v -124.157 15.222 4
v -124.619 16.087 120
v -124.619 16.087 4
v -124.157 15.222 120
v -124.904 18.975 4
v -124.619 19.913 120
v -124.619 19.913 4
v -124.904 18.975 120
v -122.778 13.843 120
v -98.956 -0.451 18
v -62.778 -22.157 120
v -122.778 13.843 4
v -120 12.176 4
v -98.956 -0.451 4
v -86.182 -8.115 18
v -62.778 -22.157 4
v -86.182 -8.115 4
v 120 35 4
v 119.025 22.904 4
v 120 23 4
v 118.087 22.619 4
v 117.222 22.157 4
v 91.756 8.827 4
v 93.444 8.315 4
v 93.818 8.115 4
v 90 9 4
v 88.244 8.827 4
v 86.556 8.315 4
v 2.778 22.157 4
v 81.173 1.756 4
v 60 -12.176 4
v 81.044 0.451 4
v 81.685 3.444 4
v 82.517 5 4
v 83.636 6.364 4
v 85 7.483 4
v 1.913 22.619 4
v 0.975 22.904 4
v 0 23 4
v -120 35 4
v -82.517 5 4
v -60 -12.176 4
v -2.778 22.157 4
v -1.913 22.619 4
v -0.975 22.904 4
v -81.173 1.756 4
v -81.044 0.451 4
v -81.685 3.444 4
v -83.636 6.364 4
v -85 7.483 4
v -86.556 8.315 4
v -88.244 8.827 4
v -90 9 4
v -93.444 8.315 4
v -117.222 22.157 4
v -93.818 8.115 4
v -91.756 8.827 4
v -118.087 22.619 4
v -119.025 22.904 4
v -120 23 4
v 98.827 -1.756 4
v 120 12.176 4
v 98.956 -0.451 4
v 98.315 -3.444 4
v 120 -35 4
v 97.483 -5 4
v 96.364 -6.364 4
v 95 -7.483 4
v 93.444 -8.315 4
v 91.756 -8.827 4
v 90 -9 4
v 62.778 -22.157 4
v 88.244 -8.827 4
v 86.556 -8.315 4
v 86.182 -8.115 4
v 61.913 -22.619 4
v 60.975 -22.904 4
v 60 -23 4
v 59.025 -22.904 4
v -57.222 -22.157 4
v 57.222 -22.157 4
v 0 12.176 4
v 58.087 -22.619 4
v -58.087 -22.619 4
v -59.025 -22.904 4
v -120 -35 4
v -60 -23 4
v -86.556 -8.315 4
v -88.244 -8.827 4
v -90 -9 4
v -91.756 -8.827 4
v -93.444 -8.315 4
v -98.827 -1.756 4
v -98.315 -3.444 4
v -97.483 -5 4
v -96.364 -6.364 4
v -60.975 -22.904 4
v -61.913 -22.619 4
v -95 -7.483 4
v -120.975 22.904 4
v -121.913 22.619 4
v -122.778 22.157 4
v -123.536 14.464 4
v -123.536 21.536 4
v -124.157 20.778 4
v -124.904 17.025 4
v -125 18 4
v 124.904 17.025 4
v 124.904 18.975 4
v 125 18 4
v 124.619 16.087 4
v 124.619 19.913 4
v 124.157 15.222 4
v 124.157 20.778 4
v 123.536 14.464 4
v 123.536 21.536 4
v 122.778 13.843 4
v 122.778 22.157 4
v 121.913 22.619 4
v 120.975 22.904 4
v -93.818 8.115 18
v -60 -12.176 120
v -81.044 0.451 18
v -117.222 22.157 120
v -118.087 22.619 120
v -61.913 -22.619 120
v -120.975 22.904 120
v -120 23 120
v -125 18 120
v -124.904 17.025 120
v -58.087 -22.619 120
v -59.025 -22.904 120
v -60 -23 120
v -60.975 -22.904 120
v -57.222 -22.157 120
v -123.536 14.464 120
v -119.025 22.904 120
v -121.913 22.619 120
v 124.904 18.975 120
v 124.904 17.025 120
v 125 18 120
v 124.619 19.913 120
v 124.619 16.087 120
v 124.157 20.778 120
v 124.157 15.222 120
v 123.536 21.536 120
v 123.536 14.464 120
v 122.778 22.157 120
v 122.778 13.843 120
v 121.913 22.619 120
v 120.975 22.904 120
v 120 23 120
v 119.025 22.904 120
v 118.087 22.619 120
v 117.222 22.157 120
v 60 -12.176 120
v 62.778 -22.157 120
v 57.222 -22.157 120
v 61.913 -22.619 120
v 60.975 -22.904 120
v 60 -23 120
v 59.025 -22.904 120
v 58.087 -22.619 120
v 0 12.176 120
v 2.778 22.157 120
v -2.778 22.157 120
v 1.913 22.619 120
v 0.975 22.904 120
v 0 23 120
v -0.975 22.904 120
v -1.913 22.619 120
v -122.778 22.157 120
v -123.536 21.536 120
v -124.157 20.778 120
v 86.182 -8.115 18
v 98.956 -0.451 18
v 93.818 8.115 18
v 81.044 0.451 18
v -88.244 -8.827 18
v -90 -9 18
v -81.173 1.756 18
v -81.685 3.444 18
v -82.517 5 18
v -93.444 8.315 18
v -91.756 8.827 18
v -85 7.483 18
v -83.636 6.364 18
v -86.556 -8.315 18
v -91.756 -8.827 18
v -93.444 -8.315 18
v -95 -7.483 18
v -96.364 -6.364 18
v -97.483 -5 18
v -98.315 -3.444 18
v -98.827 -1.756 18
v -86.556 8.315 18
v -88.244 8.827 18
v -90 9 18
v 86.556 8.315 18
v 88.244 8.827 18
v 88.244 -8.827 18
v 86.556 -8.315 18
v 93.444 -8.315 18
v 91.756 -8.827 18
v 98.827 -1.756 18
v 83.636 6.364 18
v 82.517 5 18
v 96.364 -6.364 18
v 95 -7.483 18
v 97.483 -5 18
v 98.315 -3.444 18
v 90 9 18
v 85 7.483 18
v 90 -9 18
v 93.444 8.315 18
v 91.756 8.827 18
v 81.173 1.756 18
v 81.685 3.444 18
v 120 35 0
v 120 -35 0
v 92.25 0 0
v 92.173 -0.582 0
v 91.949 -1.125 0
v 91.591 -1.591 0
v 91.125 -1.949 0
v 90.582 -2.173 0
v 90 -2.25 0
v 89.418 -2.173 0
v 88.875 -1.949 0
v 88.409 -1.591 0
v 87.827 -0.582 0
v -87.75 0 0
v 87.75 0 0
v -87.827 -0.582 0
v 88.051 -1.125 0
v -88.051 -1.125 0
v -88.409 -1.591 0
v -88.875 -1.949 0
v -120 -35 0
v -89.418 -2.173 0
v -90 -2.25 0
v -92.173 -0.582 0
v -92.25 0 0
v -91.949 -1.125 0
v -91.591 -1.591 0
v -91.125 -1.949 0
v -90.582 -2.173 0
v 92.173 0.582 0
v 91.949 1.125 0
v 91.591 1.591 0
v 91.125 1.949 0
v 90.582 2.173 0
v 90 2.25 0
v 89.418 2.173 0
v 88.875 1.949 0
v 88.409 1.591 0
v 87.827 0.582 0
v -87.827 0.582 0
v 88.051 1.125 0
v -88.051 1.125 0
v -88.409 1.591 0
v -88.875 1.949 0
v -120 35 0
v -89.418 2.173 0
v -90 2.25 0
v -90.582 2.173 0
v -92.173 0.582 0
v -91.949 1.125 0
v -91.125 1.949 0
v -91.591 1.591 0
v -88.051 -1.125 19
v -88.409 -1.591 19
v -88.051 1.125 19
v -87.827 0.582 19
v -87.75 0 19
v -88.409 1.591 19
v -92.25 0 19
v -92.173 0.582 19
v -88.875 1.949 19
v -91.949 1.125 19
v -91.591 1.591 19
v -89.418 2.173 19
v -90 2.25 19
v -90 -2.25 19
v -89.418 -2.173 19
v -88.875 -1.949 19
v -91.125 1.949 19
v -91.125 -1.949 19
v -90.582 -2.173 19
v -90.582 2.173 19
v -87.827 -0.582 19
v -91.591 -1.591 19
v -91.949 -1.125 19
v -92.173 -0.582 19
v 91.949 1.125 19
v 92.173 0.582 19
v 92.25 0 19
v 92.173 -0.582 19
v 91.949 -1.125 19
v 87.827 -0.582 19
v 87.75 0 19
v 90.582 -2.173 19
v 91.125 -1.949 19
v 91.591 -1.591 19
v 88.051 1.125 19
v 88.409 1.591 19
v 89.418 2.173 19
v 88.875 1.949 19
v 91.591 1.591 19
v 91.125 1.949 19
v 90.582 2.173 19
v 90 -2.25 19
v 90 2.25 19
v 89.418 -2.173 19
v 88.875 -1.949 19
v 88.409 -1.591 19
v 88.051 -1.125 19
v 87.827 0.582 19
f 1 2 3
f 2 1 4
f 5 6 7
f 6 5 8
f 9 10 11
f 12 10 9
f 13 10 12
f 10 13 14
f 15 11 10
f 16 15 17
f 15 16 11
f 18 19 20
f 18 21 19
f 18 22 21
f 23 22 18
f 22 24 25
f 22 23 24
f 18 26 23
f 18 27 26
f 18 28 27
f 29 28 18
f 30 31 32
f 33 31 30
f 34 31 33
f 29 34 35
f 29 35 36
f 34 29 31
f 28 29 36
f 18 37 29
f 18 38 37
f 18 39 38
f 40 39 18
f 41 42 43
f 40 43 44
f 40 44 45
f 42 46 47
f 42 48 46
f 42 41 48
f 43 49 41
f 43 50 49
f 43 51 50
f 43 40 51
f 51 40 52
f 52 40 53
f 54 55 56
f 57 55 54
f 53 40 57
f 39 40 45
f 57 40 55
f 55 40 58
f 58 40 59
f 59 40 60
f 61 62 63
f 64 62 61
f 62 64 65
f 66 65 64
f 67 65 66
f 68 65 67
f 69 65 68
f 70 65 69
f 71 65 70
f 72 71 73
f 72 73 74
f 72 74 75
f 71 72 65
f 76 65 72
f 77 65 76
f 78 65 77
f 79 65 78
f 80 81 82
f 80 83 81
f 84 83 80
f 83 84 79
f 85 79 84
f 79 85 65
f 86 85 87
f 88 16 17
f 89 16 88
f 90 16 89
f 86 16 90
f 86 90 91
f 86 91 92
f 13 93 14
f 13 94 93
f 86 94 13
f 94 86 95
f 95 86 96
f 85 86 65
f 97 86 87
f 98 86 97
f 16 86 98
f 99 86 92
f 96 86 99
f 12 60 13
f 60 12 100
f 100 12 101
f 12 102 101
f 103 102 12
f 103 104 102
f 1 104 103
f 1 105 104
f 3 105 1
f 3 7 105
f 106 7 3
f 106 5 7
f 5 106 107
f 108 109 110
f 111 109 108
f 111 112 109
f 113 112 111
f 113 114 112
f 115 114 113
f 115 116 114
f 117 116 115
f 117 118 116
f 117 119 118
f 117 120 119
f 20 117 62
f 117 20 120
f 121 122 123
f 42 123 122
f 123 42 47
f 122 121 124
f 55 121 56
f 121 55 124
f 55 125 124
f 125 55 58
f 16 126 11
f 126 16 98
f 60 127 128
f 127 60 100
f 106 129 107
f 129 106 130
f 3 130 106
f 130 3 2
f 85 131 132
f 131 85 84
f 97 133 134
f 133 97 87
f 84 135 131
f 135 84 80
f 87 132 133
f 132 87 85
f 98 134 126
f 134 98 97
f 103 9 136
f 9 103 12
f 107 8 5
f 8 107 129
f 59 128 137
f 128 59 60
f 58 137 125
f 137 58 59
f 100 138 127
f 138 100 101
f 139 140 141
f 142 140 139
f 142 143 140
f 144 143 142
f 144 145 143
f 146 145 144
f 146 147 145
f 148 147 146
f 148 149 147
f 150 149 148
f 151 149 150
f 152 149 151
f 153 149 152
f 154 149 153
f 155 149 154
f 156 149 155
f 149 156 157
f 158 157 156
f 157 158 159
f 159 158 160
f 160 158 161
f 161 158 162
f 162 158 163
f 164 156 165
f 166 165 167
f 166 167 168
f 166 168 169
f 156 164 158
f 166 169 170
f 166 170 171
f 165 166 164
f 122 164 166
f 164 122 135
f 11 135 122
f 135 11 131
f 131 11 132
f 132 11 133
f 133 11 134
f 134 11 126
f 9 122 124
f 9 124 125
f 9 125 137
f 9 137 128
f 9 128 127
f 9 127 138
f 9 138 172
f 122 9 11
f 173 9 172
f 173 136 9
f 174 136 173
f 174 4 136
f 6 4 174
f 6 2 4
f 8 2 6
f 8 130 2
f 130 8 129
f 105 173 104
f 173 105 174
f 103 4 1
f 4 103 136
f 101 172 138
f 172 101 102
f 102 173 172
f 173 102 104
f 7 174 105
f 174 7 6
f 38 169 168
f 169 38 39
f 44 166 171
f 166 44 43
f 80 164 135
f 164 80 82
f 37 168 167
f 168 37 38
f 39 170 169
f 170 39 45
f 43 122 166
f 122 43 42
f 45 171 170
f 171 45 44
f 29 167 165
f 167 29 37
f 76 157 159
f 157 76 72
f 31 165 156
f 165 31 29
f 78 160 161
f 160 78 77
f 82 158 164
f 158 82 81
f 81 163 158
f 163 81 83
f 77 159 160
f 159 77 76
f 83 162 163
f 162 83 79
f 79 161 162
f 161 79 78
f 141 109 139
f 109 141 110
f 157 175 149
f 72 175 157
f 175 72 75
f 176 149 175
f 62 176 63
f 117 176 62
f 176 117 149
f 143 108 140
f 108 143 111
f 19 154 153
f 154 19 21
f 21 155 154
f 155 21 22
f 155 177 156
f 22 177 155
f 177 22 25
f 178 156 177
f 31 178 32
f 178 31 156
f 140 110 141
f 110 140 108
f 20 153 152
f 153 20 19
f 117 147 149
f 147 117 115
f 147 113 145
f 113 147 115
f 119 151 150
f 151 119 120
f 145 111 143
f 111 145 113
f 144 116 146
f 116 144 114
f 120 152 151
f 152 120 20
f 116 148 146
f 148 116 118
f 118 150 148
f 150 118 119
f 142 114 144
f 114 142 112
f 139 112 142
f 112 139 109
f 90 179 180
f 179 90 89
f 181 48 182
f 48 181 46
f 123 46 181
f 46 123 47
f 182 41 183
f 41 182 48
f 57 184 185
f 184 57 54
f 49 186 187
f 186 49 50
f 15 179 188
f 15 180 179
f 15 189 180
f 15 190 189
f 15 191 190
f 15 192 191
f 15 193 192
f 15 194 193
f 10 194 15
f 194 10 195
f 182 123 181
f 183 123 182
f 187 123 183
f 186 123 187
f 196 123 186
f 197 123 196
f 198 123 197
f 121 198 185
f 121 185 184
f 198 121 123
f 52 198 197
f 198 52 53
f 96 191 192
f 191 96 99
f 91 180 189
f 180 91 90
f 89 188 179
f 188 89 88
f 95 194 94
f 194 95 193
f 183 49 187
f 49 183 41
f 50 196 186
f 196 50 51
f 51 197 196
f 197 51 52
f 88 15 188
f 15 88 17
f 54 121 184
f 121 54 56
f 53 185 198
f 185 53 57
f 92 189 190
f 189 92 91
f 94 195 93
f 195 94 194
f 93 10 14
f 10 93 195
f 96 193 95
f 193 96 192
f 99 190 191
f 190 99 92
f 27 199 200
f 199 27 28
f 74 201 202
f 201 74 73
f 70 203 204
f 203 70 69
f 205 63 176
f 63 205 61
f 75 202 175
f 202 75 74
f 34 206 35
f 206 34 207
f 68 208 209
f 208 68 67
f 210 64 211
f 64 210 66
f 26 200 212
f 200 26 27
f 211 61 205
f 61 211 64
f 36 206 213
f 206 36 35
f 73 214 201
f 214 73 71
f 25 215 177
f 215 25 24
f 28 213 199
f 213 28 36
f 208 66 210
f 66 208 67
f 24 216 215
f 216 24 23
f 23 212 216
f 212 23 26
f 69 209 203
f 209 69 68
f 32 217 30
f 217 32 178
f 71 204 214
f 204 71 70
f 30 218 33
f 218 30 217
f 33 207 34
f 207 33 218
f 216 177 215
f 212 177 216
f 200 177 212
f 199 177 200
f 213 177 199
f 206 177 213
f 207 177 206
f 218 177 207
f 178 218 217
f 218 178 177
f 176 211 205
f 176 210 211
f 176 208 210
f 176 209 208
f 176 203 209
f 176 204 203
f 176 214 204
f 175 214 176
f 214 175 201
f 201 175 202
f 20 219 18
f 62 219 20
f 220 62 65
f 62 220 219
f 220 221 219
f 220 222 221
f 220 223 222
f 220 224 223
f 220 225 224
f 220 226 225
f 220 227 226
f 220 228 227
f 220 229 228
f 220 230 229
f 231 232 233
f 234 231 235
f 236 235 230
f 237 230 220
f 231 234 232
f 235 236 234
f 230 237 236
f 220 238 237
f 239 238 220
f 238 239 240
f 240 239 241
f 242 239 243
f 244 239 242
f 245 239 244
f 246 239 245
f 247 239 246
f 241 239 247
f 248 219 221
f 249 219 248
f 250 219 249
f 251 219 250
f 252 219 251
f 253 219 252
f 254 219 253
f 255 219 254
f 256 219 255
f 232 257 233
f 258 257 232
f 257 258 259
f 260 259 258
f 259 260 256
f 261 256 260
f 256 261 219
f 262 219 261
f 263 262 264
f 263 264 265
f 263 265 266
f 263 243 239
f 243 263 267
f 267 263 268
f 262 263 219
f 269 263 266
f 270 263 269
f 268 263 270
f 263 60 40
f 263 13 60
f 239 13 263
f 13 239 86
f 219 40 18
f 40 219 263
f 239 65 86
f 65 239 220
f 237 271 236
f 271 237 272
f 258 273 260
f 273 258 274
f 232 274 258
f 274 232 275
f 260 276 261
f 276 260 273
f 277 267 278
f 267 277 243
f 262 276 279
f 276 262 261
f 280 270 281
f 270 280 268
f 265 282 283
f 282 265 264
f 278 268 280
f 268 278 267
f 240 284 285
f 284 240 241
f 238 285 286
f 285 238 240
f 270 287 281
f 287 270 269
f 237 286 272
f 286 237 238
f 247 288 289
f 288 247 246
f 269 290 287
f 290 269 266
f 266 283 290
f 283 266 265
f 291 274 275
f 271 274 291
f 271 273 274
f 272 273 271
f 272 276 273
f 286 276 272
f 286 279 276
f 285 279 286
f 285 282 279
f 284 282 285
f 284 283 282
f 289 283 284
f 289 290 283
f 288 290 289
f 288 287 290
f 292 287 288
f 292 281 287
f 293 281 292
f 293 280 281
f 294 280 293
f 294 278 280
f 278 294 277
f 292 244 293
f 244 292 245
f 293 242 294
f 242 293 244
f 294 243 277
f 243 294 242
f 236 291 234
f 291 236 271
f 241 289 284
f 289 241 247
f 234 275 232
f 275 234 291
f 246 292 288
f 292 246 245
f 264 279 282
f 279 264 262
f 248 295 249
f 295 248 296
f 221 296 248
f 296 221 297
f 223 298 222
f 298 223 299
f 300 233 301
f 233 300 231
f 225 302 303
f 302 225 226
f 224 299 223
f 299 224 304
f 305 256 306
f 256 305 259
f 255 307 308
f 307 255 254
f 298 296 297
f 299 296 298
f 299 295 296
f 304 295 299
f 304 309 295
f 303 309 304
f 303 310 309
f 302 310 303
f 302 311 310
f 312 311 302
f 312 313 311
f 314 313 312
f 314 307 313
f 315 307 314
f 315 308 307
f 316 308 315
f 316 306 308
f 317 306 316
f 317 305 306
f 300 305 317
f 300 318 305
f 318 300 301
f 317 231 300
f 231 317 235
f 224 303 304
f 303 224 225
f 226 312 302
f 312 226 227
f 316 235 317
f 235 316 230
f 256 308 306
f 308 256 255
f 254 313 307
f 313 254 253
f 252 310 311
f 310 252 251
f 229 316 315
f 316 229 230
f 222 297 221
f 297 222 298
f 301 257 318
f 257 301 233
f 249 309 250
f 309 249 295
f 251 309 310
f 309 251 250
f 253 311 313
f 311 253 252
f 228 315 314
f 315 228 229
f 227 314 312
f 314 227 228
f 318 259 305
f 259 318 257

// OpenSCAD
wall_length=240; wall_depth=70; wall_height=120; wall_thickness=10; base_thickness=4; mount_hole_diameter=4.5;
module canyon_wall_right() { difference() { union() {
 translate([-wall_length/2,-wall_depth/2,0]) cube([wall_length,wall_depth,base_thickness]);
 for(i=[0:3]) { x1=-wall_length/2+i*wall_length/4; x2=-wall_length/2+(i+1)*wall_length/4; y1=-(i%2==0?-18:18); y2=-((i+1)%2==0?-18:18);
  hull(){ translate([x1,y1,base_thickness]) cylinder(d=wall_thickness,h=wall_height-base_thickness,$fn=32); translate([x2,y2,base_thickness]) cylinder(d=wall_thickness,h=wall_height-base_thickness,$fn=32); }}
 for(x=[-90,90]) translate([x,0,base_thickness]) cylinder(d=18,h=14,$fn=32);
 } for(x=[-90,90]) translate([x,0,-1]) cylinder(d=mount_hole_diameter,h=20,$fn=24); }}
assert(wall_length==240 && wall_depth==70 && wall_height==120); echo("SCADCTL_REQUIREMENT:parameters:PASS"); canyon_wall_right();
